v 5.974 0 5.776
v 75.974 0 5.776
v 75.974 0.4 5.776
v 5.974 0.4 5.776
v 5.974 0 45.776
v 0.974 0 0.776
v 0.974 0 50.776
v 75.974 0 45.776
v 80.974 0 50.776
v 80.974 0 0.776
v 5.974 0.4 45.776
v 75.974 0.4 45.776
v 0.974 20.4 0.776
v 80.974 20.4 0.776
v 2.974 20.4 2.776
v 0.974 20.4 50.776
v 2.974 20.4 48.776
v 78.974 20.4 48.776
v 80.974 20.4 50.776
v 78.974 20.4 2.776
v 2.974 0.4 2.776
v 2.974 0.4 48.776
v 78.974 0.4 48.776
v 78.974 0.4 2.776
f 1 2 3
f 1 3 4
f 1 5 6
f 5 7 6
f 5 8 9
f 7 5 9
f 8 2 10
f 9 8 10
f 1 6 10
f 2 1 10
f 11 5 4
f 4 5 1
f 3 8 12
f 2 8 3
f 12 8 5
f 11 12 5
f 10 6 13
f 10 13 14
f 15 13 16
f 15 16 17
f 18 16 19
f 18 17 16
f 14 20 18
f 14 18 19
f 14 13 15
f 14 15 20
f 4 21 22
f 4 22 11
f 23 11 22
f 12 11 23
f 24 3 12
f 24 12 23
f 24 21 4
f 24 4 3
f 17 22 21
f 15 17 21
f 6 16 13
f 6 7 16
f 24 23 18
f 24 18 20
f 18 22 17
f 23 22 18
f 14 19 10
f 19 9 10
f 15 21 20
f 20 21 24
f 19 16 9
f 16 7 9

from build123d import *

# Parameters (mm, degrees)
SKETCH1_W           = 80
SKETCH1_H           = 50
BOSS_EXTRUDE1_DEPTH = 0.4
SKETCH2_W           = 80
SKETCH2_H           = 50
SKETCH2_W_2         = 76
SKETCH2_H_2         = 46
BOSS_EXTRUDE2_DEPTH = 20
SKETCH3_W           = 70
SKETCH3_H           = 40
CUT_EXTRUDE1_DEPTH  = 98.729539691


with BuildPart() as part:
    # Sketch1 → Boss-Extrude1 (new body)
    with BuildSketch(Plane(origin=(0, 0, 0), x_dir=(1, 0, 0), z_dir=(0, 1, 0))):
        with Locations((40.973770478, -25.775500222)):
            Rectangle(SKETCH1_W, SKETCH1_H)
    extrude(amount=BOSS_EXTRUDE1_DEPTH)

    # Sketch2 → Boss-Extrude2 (add)
    with BuildSketch(Plane(origin=(0, 0.4, 0), x_dir=(1, 0, 0), z_dir=(0, 1, 0))):
        with Locations((40.973770478, -25.775500222)):
            Rectangle(SKETCH2_W, SKETCH2_H)
        with Locations((40.973770478, -25.775500222)):
            Rectangle(SKETCH2_W_2, SKETCH2_H_2, mode=Mode.SUBTRACT)
    extrude(amount=BOSS_EXTRUDE2_DEPTH)

    # Sketch3 → Cut-Extrude1 (cut, through all)
    with BuildSketch(Plane(origin=(0, 0, 0), x_dir=(-1, 0, 0), z_dir=(0, -1, 0))):
        with Locations((-40.973770478, -25.775500222)):
            Rectangle(SKETCH3_W, SKETCH3_H)
    extrude(amount=-CUT_EXTRUDE1_DEPTH, mode=Mode.SUBTRACT)


solid = part.part
